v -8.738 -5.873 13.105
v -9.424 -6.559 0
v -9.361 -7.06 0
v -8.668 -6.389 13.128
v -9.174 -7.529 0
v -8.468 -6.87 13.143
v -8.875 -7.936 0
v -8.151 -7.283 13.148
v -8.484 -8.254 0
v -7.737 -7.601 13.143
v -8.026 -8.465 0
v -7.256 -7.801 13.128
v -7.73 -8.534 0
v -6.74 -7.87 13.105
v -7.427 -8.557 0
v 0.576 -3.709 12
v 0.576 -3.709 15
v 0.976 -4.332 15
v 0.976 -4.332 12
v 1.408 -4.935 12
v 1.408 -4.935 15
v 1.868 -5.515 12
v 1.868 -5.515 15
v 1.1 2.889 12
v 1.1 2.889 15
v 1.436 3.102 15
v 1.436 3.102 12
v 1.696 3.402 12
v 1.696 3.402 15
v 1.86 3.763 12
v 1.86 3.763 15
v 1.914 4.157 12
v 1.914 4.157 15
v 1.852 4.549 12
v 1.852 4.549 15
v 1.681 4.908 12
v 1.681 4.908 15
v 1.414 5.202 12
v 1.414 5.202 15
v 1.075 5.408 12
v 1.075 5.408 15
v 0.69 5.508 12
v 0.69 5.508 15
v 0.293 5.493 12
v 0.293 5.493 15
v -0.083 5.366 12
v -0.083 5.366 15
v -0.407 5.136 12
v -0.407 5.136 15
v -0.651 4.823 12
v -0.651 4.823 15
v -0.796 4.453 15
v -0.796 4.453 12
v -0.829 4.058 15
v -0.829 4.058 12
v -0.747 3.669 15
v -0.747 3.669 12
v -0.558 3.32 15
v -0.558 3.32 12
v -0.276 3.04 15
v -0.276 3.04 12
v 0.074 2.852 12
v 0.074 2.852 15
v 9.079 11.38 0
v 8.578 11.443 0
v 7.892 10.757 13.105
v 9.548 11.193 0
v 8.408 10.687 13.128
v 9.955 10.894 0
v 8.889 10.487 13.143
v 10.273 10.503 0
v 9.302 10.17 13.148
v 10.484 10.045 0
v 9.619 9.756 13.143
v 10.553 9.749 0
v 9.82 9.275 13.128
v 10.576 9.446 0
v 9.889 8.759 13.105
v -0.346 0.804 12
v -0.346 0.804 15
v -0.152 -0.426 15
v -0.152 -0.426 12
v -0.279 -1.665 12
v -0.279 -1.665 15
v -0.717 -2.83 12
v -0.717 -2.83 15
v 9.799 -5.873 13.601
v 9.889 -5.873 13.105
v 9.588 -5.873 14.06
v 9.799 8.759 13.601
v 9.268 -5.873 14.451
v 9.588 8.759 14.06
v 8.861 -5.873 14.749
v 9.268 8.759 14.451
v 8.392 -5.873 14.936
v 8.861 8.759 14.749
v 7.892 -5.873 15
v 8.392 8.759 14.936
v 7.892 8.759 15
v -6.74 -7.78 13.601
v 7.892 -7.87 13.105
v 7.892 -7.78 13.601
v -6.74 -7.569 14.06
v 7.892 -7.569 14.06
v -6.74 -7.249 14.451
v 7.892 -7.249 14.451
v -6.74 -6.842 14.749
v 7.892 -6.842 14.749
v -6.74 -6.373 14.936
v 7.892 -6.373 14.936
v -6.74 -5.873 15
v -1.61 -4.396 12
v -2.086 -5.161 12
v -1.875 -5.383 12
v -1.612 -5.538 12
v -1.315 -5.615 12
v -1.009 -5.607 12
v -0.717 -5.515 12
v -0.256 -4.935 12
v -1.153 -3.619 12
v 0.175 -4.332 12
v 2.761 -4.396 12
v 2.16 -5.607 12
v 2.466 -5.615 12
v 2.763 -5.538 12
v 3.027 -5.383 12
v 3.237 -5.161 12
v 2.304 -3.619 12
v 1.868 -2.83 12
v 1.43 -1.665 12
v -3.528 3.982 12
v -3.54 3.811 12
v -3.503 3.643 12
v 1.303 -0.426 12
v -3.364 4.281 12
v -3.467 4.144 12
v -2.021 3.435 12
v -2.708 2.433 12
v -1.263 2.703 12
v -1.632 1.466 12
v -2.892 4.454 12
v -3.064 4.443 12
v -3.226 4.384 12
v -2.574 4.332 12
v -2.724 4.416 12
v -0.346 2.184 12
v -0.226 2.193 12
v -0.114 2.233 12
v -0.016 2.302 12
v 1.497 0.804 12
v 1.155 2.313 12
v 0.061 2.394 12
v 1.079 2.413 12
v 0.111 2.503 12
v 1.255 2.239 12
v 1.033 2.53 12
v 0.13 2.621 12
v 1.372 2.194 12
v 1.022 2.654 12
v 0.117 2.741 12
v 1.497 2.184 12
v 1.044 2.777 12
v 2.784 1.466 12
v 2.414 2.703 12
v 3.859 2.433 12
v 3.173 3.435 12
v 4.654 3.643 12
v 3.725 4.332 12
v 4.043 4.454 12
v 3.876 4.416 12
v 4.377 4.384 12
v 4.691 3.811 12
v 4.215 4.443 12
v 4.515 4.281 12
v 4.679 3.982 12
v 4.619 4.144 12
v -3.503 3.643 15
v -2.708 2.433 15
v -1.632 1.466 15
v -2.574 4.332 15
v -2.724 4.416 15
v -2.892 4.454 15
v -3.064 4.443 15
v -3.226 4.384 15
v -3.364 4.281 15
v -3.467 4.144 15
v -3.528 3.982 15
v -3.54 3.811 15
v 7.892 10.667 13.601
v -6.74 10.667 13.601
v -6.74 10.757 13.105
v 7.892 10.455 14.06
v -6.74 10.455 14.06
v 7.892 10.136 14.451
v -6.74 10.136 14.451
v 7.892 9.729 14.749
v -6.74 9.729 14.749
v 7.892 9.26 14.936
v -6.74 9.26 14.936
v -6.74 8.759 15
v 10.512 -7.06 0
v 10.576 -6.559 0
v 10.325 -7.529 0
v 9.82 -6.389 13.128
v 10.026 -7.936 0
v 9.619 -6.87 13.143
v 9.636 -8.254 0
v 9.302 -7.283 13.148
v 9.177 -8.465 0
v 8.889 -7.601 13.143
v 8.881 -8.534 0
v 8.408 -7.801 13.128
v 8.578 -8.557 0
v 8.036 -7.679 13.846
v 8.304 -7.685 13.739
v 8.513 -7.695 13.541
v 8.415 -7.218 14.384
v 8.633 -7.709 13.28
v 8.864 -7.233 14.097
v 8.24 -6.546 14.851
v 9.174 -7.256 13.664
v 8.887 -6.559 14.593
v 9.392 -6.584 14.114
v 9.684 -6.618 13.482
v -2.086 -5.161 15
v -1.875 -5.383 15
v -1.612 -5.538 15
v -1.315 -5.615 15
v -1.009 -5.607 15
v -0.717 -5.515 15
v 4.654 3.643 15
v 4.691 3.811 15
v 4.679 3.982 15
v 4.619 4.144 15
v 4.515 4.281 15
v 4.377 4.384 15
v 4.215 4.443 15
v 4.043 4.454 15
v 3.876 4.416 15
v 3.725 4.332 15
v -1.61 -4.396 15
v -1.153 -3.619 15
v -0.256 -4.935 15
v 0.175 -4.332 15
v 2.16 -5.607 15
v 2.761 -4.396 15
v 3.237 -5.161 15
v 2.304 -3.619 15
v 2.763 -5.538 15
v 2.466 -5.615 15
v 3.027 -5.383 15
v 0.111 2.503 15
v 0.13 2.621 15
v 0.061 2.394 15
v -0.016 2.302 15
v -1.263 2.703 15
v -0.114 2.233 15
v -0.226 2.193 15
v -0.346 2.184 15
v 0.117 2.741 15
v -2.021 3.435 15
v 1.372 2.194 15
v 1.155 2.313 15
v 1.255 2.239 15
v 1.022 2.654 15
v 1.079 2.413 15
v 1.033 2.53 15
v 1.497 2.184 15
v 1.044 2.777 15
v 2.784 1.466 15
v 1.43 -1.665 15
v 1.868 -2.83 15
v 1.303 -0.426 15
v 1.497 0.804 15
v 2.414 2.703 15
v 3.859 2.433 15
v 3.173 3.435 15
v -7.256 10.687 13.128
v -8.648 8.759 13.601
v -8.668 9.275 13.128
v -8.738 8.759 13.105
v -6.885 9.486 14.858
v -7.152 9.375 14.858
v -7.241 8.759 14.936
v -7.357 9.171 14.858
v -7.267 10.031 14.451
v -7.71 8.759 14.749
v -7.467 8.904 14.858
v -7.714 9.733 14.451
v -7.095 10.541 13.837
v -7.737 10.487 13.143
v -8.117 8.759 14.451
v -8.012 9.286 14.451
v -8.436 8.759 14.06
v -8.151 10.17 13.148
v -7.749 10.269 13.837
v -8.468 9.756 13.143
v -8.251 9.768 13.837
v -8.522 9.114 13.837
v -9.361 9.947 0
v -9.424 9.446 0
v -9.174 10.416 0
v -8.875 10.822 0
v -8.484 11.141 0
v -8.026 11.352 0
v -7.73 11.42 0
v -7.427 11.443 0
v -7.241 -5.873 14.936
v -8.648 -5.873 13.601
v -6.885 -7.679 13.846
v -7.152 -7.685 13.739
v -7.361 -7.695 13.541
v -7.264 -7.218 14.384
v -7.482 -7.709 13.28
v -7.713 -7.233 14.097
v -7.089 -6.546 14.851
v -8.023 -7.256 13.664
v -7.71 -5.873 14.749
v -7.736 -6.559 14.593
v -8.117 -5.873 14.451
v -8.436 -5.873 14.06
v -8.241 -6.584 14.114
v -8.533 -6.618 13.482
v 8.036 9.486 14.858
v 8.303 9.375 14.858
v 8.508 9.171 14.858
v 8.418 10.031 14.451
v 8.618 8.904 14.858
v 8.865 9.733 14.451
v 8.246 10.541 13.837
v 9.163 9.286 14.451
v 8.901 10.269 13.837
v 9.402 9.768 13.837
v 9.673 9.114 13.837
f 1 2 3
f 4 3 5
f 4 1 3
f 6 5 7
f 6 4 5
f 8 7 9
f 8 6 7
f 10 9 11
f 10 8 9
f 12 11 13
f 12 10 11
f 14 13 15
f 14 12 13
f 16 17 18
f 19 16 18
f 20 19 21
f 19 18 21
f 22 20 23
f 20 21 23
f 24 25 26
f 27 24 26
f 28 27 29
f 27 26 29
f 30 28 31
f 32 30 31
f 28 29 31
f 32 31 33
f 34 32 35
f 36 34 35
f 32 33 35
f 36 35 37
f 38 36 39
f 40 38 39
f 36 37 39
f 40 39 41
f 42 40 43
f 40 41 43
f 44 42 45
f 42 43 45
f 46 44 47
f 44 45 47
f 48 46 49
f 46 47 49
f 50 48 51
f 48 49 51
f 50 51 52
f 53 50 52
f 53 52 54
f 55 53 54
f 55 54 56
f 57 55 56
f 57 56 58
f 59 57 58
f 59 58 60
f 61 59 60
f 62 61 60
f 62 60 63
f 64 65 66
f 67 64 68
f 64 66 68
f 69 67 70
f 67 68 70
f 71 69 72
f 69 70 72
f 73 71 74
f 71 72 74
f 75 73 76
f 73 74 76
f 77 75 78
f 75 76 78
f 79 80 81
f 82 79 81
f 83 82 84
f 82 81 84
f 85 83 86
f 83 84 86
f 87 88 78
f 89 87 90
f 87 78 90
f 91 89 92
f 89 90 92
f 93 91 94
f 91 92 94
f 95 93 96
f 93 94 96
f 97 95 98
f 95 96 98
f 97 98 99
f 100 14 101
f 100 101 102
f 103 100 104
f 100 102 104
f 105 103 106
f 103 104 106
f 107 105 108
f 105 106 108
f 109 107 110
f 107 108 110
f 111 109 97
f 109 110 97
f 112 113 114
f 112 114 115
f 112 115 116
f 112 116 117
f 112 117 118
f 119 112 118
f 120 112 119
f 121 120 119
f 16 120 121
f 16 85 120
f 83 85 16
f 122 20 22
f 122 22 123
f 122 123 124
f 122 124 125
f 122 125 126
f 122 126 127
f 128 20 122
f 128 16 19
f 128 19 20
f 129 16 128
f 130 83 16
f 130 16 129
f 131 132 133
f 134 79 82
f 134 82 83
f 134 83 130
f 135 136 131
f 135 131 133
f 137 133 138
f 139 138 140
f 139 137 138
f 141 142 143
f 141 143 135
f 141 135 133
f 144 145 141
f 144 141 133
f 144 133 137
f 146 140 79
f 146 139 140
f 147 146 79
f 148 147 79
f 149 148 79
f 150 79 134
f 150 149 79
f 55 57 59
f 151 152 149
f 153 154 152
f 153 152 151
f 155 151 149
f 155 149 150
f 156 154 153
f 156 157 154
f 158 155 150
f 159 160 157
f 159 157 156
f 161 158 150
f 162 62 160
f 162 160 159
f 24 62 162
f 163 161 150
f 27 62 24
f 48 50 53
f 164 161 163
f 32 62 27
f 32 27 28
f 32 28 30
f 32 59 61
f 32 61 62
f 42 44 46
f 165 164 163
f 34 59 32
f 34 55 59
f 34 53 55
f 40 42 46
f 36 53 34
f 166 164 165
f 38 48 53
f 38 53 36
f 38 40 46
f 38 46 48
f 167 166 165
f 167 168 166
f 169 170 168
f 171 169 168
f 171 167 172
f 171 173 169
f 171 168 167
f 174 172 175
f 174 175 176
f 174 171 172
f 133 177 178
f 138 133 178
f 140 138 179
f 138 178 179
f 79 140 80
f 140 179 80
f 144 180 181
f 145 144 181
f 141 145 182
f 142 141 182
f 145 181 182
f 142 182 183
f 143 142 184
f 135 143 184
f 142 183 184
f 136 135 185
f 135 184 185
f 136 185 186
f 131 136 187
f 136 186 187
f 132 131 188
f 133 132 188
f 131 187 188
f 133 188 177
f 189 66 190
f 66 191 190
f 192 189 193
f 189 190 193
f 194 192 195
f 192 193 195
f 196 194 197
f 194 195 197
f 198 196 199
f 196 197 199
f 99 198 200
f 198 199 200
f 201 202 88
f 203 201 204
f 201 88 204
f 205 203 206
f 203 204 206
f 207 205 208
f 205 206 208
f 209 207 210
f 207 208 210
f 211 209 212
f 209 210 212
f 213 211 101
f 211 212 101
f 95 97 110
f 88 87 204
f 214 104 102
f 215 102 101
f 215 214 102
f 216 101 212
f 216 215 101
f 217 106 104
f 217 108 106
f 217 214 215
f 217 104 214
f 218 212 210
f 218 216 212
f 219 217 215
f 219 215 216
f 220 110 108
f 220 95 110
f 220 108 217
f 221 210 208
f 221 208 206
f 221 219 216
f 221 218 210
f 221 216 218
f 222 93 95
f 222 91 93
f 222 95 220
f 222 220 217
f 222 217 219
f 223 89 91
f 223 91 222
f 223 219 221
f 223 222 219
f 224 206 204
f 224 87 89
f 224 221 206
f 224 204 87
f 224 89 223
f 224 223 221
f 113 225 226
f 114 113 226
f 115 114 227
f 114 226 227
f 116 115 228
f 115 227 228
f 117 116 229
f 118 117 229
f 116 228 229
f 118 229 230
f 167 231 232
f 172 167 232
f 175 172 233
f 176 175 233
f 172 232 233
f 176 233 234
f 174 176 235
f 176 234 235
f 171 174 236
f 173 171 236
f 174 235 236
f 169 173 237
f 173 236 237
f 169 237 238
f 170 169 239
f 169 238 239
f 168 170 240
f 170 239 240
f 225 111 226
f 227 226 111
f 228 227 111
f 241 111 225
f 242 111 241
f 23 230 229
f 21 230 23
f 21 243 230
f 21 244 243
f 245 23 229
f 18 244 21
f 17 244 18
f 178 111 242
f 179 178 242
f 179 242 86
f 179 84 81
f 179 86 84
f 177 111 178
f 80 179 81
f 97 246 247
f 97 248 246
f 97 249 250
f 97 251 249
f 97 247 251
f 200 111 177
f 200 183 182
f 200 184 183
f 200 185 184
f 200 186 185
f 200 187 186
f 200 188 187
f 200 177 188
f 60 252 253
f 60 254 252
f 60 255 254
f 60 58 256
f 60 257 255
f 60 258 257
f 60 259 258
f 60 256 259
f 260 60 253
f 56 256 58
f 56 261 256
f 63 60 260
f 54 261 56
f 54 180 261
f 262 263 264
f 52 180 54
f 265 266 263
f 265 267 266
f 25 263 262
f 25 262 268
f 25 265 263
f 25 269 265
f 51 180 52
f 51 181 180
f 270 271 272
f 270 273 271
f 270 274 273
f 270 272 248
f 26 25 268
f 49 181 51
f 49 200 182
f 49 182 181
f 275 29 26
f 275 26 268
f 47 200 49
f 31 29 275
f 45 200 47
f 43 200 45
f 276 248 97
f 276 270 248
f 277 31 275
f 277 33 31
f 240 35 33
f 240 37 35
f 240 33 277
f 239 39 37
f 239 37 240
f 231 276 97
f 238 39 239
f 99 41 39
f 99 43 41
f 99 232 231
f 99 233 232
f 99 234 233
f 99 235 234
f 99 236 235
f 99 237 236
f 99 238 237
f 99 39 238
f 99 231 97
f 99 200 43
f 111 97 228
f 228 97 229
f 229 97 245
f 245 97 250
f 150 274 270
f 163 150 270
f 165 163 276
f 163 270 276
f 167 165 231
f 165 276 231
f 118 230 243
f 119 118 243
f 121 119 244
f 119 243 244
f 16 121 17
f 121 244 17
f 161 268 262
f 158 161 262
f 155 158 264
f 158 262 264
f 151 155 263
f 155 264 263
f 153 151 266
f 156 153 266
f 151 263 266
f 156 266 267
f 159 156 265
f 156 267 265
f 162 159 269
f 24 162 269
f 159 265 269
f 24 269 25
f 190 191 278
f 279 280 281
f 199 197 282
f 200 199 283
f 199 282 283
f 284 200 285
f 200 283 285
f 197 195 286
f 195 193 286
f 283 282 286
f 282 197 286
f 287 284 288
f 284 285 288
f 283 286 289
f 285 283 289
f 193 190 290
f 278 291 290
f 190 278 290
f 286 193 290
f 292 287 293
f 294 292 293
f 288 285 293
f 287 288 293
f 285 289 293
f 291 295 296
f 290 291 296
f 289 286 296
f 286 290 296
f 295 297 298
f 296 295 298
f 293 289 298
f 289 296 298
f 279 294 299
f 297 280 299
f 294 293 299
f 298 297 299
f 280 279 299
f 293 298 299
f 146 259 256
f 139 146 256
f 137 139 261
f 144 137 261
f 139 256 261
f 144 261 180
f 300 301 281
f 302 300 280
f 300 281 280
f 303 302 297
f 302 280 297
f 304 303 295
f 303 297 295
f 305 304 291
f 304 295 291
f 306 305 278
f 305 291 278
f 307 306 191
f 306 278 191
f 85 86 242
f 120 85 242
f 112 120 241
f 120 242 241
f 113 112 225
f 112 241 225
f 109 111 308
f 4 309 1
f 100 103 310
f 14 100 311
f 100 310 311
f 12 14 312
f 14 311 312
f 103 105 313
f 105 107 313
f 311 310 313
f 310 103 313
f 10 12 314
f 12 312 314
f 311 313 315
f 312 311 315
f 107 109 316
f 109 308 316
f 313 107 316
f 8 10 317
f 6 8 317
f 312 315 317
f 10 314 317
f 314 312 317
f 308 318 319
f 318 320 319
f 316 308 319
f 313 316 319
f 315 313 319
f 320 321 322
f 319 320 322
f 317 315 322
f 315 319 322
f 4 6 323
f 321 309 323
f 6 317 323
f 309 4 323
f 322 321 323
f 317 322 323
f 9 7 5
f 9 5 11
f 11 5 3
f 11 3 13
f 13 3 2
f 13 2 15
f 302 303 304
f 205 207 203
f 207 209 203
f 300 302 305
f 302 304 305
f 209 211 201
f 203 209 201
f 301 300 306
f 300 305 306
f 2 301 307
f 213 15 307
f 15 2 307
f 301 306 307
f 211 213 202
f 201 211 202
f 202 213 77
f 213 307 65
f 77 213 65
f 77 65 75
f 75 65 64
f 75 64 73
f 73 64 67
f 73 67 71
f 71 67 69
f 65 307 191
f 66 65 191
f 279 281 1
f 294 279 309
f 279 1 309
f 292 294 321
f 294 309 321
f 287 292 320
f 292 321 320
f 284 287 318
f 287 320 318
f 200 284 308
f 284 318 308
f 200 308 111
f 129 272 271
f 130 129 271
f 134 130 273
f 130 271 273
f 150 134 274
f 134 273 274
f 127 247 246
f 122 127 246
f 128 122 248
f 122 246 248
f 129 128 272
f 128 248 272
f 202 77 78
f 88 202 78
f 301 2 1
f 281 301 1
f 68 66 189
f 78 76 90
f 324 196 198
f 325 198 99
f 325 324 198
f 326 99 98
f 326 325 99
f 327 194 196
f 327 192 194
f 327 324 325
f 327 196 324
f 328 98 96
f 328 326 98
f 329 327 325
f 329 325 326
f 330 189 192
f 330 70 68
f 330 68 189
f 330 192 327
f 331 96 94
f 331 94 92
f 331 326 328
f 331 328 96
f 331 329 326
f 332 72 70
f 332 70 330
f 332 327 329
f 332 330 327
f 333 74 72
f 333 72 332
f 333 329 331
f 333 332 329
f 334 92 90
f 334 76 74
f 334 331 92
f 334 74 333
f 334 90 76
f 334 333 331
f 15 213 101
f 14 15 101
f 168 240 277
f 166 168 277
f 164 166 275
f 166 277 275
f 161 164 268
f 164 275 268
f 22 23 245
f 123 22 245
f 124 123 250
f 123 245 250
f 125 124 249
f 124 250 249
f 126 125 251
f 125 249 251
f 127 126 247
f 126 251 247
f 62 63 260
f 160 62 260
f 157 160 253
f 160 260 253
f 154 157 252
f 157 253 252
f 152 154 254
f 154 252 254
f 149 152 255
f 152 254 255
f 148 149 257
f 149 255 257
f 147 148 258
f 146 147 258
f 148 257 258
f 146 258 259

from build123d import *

# Parameters (mm, degrees)
F0_W     = 20
F0_H     = 20
F1_DEPTH = 15
F1_TAPER = 3
F2_R     = 2
F4_DEPTH = 3


with BuildPart() as f1:
    # F0 (on Top) → F1 (new body)
    with BuildSketch(Plane.XY):
        with Locations((0.5756109022, 1.4432906293)):
            Rectangle(F0_W, F0_H)
    extrude(amount=F1_DEPTH, taper=F1_TAPER)

    # F2
    f2_edges = [f1.edges().sort_by_distance(p)[0] for p in [
        (10.182552, 11.050232, 7.500009),
        (-9.031331, 11.050232, 7.5),
        (0.575611, 10.657174, 15),
        (9.789494, 1.443291, 15),
        (-8.638272, 1.443291, 15),
        (0.575611, -7.770593, 15),
        (10.182553, -8.163651, 7.5),
        (-9.031331, -8.163651, 7.5),
    ]]
    fillet(f2_edges, radius=F2_R)

    # F3 (on face) → F4 (cut)
    with BuildSketch(Plane.XY.offset(15)):
        with BuildLine():
            ThreePointArc((0.0739849746, 2.8522026186), (0.0610210241, 2.3942139809), (-0.3458335996, 2.1835223306))
            ThreePointArc((-0.3458335996, 2.1835223306), (-1.6651722336, 3.0450533776), (-2.5740938727, 4.332202021))
            ThreePointArc((-2.5740938727, 4.332202021), (-3.2984354247, 4.3375147134), (-3.5025356337, 3.6425024737))
            ThreePointArc((-3.5025356337, 3.6425024737), (-2.2013261333, 1.9150900343), (-0.3458335996, 0.8041231777))
            ThreePointArc((-0.3458335996, 0.8041231777), (-0.1755041632, -1.0493512959), (-0.7172103506, -2.8300629929))
            ThreePointArc((-0.7172103506, -2.8300629929), (-1.3788731625, -4.0087859867), (-2.0861055236, -5.160744302))
            ThreePointArc((-2.0861055236, -5.160744302), (-1.4661125478, -5.5869675362), (-0.7172103506, -5.5148354732))
            ThreePointArc((-0.7172103506, -5.5148354732), (-0.0370124501, -4.6360900284), (0.5756109022, -3.708967939))
            ThreePointArc((0.5756109022, -3.708967939), (1.1882342544, -4.6360900284), (1.8684321549, -5.5148354732))
            ThreePointArc((1.8684321549, -5.5148354732), (2.6173343521, -5.5869675362), (3.237327328, -5.160744302))
            ThreePointArc((3.237327328, -5.160744302), (2.5300949668, -4.0087859867), (1.8684321549, -2.8300629929))
            ThreePointArc((1.8684321549, -2.8300629929), (1.3267259675, -1.0493512959), (1.4970554039, 0.8041231777))
            ThreePointArc((1.4970554039, 0.8041231777), (3.3525479377, 1.9150900343), (4.6537574381, 3.6425024737))
            ThreePointArc((4.6537574381, 3.6425024737), (4.449657229, 4.3375147134), (3.725315677, 4.332202021))
            ThreePointArc((3.725315677, 4.332202021), (2.8163940379, 3.0450533776), (1.4970554039, 2.1835223306))
            ThreePointArc((1.4970554039, 2.1835223306), (1.0790271453, 2.4130070709), (1.100178456, 2.8894139275))
            ThreePointArc((1.100178456, 2.8894139275), (0.4912082686, 5.5147546705), (0.0739849746, 2.8522026186))
        make_face()
    extrude(amount=-F4_DEPTH, mode=Mode.SUBTRACT)


solid = f1.part
